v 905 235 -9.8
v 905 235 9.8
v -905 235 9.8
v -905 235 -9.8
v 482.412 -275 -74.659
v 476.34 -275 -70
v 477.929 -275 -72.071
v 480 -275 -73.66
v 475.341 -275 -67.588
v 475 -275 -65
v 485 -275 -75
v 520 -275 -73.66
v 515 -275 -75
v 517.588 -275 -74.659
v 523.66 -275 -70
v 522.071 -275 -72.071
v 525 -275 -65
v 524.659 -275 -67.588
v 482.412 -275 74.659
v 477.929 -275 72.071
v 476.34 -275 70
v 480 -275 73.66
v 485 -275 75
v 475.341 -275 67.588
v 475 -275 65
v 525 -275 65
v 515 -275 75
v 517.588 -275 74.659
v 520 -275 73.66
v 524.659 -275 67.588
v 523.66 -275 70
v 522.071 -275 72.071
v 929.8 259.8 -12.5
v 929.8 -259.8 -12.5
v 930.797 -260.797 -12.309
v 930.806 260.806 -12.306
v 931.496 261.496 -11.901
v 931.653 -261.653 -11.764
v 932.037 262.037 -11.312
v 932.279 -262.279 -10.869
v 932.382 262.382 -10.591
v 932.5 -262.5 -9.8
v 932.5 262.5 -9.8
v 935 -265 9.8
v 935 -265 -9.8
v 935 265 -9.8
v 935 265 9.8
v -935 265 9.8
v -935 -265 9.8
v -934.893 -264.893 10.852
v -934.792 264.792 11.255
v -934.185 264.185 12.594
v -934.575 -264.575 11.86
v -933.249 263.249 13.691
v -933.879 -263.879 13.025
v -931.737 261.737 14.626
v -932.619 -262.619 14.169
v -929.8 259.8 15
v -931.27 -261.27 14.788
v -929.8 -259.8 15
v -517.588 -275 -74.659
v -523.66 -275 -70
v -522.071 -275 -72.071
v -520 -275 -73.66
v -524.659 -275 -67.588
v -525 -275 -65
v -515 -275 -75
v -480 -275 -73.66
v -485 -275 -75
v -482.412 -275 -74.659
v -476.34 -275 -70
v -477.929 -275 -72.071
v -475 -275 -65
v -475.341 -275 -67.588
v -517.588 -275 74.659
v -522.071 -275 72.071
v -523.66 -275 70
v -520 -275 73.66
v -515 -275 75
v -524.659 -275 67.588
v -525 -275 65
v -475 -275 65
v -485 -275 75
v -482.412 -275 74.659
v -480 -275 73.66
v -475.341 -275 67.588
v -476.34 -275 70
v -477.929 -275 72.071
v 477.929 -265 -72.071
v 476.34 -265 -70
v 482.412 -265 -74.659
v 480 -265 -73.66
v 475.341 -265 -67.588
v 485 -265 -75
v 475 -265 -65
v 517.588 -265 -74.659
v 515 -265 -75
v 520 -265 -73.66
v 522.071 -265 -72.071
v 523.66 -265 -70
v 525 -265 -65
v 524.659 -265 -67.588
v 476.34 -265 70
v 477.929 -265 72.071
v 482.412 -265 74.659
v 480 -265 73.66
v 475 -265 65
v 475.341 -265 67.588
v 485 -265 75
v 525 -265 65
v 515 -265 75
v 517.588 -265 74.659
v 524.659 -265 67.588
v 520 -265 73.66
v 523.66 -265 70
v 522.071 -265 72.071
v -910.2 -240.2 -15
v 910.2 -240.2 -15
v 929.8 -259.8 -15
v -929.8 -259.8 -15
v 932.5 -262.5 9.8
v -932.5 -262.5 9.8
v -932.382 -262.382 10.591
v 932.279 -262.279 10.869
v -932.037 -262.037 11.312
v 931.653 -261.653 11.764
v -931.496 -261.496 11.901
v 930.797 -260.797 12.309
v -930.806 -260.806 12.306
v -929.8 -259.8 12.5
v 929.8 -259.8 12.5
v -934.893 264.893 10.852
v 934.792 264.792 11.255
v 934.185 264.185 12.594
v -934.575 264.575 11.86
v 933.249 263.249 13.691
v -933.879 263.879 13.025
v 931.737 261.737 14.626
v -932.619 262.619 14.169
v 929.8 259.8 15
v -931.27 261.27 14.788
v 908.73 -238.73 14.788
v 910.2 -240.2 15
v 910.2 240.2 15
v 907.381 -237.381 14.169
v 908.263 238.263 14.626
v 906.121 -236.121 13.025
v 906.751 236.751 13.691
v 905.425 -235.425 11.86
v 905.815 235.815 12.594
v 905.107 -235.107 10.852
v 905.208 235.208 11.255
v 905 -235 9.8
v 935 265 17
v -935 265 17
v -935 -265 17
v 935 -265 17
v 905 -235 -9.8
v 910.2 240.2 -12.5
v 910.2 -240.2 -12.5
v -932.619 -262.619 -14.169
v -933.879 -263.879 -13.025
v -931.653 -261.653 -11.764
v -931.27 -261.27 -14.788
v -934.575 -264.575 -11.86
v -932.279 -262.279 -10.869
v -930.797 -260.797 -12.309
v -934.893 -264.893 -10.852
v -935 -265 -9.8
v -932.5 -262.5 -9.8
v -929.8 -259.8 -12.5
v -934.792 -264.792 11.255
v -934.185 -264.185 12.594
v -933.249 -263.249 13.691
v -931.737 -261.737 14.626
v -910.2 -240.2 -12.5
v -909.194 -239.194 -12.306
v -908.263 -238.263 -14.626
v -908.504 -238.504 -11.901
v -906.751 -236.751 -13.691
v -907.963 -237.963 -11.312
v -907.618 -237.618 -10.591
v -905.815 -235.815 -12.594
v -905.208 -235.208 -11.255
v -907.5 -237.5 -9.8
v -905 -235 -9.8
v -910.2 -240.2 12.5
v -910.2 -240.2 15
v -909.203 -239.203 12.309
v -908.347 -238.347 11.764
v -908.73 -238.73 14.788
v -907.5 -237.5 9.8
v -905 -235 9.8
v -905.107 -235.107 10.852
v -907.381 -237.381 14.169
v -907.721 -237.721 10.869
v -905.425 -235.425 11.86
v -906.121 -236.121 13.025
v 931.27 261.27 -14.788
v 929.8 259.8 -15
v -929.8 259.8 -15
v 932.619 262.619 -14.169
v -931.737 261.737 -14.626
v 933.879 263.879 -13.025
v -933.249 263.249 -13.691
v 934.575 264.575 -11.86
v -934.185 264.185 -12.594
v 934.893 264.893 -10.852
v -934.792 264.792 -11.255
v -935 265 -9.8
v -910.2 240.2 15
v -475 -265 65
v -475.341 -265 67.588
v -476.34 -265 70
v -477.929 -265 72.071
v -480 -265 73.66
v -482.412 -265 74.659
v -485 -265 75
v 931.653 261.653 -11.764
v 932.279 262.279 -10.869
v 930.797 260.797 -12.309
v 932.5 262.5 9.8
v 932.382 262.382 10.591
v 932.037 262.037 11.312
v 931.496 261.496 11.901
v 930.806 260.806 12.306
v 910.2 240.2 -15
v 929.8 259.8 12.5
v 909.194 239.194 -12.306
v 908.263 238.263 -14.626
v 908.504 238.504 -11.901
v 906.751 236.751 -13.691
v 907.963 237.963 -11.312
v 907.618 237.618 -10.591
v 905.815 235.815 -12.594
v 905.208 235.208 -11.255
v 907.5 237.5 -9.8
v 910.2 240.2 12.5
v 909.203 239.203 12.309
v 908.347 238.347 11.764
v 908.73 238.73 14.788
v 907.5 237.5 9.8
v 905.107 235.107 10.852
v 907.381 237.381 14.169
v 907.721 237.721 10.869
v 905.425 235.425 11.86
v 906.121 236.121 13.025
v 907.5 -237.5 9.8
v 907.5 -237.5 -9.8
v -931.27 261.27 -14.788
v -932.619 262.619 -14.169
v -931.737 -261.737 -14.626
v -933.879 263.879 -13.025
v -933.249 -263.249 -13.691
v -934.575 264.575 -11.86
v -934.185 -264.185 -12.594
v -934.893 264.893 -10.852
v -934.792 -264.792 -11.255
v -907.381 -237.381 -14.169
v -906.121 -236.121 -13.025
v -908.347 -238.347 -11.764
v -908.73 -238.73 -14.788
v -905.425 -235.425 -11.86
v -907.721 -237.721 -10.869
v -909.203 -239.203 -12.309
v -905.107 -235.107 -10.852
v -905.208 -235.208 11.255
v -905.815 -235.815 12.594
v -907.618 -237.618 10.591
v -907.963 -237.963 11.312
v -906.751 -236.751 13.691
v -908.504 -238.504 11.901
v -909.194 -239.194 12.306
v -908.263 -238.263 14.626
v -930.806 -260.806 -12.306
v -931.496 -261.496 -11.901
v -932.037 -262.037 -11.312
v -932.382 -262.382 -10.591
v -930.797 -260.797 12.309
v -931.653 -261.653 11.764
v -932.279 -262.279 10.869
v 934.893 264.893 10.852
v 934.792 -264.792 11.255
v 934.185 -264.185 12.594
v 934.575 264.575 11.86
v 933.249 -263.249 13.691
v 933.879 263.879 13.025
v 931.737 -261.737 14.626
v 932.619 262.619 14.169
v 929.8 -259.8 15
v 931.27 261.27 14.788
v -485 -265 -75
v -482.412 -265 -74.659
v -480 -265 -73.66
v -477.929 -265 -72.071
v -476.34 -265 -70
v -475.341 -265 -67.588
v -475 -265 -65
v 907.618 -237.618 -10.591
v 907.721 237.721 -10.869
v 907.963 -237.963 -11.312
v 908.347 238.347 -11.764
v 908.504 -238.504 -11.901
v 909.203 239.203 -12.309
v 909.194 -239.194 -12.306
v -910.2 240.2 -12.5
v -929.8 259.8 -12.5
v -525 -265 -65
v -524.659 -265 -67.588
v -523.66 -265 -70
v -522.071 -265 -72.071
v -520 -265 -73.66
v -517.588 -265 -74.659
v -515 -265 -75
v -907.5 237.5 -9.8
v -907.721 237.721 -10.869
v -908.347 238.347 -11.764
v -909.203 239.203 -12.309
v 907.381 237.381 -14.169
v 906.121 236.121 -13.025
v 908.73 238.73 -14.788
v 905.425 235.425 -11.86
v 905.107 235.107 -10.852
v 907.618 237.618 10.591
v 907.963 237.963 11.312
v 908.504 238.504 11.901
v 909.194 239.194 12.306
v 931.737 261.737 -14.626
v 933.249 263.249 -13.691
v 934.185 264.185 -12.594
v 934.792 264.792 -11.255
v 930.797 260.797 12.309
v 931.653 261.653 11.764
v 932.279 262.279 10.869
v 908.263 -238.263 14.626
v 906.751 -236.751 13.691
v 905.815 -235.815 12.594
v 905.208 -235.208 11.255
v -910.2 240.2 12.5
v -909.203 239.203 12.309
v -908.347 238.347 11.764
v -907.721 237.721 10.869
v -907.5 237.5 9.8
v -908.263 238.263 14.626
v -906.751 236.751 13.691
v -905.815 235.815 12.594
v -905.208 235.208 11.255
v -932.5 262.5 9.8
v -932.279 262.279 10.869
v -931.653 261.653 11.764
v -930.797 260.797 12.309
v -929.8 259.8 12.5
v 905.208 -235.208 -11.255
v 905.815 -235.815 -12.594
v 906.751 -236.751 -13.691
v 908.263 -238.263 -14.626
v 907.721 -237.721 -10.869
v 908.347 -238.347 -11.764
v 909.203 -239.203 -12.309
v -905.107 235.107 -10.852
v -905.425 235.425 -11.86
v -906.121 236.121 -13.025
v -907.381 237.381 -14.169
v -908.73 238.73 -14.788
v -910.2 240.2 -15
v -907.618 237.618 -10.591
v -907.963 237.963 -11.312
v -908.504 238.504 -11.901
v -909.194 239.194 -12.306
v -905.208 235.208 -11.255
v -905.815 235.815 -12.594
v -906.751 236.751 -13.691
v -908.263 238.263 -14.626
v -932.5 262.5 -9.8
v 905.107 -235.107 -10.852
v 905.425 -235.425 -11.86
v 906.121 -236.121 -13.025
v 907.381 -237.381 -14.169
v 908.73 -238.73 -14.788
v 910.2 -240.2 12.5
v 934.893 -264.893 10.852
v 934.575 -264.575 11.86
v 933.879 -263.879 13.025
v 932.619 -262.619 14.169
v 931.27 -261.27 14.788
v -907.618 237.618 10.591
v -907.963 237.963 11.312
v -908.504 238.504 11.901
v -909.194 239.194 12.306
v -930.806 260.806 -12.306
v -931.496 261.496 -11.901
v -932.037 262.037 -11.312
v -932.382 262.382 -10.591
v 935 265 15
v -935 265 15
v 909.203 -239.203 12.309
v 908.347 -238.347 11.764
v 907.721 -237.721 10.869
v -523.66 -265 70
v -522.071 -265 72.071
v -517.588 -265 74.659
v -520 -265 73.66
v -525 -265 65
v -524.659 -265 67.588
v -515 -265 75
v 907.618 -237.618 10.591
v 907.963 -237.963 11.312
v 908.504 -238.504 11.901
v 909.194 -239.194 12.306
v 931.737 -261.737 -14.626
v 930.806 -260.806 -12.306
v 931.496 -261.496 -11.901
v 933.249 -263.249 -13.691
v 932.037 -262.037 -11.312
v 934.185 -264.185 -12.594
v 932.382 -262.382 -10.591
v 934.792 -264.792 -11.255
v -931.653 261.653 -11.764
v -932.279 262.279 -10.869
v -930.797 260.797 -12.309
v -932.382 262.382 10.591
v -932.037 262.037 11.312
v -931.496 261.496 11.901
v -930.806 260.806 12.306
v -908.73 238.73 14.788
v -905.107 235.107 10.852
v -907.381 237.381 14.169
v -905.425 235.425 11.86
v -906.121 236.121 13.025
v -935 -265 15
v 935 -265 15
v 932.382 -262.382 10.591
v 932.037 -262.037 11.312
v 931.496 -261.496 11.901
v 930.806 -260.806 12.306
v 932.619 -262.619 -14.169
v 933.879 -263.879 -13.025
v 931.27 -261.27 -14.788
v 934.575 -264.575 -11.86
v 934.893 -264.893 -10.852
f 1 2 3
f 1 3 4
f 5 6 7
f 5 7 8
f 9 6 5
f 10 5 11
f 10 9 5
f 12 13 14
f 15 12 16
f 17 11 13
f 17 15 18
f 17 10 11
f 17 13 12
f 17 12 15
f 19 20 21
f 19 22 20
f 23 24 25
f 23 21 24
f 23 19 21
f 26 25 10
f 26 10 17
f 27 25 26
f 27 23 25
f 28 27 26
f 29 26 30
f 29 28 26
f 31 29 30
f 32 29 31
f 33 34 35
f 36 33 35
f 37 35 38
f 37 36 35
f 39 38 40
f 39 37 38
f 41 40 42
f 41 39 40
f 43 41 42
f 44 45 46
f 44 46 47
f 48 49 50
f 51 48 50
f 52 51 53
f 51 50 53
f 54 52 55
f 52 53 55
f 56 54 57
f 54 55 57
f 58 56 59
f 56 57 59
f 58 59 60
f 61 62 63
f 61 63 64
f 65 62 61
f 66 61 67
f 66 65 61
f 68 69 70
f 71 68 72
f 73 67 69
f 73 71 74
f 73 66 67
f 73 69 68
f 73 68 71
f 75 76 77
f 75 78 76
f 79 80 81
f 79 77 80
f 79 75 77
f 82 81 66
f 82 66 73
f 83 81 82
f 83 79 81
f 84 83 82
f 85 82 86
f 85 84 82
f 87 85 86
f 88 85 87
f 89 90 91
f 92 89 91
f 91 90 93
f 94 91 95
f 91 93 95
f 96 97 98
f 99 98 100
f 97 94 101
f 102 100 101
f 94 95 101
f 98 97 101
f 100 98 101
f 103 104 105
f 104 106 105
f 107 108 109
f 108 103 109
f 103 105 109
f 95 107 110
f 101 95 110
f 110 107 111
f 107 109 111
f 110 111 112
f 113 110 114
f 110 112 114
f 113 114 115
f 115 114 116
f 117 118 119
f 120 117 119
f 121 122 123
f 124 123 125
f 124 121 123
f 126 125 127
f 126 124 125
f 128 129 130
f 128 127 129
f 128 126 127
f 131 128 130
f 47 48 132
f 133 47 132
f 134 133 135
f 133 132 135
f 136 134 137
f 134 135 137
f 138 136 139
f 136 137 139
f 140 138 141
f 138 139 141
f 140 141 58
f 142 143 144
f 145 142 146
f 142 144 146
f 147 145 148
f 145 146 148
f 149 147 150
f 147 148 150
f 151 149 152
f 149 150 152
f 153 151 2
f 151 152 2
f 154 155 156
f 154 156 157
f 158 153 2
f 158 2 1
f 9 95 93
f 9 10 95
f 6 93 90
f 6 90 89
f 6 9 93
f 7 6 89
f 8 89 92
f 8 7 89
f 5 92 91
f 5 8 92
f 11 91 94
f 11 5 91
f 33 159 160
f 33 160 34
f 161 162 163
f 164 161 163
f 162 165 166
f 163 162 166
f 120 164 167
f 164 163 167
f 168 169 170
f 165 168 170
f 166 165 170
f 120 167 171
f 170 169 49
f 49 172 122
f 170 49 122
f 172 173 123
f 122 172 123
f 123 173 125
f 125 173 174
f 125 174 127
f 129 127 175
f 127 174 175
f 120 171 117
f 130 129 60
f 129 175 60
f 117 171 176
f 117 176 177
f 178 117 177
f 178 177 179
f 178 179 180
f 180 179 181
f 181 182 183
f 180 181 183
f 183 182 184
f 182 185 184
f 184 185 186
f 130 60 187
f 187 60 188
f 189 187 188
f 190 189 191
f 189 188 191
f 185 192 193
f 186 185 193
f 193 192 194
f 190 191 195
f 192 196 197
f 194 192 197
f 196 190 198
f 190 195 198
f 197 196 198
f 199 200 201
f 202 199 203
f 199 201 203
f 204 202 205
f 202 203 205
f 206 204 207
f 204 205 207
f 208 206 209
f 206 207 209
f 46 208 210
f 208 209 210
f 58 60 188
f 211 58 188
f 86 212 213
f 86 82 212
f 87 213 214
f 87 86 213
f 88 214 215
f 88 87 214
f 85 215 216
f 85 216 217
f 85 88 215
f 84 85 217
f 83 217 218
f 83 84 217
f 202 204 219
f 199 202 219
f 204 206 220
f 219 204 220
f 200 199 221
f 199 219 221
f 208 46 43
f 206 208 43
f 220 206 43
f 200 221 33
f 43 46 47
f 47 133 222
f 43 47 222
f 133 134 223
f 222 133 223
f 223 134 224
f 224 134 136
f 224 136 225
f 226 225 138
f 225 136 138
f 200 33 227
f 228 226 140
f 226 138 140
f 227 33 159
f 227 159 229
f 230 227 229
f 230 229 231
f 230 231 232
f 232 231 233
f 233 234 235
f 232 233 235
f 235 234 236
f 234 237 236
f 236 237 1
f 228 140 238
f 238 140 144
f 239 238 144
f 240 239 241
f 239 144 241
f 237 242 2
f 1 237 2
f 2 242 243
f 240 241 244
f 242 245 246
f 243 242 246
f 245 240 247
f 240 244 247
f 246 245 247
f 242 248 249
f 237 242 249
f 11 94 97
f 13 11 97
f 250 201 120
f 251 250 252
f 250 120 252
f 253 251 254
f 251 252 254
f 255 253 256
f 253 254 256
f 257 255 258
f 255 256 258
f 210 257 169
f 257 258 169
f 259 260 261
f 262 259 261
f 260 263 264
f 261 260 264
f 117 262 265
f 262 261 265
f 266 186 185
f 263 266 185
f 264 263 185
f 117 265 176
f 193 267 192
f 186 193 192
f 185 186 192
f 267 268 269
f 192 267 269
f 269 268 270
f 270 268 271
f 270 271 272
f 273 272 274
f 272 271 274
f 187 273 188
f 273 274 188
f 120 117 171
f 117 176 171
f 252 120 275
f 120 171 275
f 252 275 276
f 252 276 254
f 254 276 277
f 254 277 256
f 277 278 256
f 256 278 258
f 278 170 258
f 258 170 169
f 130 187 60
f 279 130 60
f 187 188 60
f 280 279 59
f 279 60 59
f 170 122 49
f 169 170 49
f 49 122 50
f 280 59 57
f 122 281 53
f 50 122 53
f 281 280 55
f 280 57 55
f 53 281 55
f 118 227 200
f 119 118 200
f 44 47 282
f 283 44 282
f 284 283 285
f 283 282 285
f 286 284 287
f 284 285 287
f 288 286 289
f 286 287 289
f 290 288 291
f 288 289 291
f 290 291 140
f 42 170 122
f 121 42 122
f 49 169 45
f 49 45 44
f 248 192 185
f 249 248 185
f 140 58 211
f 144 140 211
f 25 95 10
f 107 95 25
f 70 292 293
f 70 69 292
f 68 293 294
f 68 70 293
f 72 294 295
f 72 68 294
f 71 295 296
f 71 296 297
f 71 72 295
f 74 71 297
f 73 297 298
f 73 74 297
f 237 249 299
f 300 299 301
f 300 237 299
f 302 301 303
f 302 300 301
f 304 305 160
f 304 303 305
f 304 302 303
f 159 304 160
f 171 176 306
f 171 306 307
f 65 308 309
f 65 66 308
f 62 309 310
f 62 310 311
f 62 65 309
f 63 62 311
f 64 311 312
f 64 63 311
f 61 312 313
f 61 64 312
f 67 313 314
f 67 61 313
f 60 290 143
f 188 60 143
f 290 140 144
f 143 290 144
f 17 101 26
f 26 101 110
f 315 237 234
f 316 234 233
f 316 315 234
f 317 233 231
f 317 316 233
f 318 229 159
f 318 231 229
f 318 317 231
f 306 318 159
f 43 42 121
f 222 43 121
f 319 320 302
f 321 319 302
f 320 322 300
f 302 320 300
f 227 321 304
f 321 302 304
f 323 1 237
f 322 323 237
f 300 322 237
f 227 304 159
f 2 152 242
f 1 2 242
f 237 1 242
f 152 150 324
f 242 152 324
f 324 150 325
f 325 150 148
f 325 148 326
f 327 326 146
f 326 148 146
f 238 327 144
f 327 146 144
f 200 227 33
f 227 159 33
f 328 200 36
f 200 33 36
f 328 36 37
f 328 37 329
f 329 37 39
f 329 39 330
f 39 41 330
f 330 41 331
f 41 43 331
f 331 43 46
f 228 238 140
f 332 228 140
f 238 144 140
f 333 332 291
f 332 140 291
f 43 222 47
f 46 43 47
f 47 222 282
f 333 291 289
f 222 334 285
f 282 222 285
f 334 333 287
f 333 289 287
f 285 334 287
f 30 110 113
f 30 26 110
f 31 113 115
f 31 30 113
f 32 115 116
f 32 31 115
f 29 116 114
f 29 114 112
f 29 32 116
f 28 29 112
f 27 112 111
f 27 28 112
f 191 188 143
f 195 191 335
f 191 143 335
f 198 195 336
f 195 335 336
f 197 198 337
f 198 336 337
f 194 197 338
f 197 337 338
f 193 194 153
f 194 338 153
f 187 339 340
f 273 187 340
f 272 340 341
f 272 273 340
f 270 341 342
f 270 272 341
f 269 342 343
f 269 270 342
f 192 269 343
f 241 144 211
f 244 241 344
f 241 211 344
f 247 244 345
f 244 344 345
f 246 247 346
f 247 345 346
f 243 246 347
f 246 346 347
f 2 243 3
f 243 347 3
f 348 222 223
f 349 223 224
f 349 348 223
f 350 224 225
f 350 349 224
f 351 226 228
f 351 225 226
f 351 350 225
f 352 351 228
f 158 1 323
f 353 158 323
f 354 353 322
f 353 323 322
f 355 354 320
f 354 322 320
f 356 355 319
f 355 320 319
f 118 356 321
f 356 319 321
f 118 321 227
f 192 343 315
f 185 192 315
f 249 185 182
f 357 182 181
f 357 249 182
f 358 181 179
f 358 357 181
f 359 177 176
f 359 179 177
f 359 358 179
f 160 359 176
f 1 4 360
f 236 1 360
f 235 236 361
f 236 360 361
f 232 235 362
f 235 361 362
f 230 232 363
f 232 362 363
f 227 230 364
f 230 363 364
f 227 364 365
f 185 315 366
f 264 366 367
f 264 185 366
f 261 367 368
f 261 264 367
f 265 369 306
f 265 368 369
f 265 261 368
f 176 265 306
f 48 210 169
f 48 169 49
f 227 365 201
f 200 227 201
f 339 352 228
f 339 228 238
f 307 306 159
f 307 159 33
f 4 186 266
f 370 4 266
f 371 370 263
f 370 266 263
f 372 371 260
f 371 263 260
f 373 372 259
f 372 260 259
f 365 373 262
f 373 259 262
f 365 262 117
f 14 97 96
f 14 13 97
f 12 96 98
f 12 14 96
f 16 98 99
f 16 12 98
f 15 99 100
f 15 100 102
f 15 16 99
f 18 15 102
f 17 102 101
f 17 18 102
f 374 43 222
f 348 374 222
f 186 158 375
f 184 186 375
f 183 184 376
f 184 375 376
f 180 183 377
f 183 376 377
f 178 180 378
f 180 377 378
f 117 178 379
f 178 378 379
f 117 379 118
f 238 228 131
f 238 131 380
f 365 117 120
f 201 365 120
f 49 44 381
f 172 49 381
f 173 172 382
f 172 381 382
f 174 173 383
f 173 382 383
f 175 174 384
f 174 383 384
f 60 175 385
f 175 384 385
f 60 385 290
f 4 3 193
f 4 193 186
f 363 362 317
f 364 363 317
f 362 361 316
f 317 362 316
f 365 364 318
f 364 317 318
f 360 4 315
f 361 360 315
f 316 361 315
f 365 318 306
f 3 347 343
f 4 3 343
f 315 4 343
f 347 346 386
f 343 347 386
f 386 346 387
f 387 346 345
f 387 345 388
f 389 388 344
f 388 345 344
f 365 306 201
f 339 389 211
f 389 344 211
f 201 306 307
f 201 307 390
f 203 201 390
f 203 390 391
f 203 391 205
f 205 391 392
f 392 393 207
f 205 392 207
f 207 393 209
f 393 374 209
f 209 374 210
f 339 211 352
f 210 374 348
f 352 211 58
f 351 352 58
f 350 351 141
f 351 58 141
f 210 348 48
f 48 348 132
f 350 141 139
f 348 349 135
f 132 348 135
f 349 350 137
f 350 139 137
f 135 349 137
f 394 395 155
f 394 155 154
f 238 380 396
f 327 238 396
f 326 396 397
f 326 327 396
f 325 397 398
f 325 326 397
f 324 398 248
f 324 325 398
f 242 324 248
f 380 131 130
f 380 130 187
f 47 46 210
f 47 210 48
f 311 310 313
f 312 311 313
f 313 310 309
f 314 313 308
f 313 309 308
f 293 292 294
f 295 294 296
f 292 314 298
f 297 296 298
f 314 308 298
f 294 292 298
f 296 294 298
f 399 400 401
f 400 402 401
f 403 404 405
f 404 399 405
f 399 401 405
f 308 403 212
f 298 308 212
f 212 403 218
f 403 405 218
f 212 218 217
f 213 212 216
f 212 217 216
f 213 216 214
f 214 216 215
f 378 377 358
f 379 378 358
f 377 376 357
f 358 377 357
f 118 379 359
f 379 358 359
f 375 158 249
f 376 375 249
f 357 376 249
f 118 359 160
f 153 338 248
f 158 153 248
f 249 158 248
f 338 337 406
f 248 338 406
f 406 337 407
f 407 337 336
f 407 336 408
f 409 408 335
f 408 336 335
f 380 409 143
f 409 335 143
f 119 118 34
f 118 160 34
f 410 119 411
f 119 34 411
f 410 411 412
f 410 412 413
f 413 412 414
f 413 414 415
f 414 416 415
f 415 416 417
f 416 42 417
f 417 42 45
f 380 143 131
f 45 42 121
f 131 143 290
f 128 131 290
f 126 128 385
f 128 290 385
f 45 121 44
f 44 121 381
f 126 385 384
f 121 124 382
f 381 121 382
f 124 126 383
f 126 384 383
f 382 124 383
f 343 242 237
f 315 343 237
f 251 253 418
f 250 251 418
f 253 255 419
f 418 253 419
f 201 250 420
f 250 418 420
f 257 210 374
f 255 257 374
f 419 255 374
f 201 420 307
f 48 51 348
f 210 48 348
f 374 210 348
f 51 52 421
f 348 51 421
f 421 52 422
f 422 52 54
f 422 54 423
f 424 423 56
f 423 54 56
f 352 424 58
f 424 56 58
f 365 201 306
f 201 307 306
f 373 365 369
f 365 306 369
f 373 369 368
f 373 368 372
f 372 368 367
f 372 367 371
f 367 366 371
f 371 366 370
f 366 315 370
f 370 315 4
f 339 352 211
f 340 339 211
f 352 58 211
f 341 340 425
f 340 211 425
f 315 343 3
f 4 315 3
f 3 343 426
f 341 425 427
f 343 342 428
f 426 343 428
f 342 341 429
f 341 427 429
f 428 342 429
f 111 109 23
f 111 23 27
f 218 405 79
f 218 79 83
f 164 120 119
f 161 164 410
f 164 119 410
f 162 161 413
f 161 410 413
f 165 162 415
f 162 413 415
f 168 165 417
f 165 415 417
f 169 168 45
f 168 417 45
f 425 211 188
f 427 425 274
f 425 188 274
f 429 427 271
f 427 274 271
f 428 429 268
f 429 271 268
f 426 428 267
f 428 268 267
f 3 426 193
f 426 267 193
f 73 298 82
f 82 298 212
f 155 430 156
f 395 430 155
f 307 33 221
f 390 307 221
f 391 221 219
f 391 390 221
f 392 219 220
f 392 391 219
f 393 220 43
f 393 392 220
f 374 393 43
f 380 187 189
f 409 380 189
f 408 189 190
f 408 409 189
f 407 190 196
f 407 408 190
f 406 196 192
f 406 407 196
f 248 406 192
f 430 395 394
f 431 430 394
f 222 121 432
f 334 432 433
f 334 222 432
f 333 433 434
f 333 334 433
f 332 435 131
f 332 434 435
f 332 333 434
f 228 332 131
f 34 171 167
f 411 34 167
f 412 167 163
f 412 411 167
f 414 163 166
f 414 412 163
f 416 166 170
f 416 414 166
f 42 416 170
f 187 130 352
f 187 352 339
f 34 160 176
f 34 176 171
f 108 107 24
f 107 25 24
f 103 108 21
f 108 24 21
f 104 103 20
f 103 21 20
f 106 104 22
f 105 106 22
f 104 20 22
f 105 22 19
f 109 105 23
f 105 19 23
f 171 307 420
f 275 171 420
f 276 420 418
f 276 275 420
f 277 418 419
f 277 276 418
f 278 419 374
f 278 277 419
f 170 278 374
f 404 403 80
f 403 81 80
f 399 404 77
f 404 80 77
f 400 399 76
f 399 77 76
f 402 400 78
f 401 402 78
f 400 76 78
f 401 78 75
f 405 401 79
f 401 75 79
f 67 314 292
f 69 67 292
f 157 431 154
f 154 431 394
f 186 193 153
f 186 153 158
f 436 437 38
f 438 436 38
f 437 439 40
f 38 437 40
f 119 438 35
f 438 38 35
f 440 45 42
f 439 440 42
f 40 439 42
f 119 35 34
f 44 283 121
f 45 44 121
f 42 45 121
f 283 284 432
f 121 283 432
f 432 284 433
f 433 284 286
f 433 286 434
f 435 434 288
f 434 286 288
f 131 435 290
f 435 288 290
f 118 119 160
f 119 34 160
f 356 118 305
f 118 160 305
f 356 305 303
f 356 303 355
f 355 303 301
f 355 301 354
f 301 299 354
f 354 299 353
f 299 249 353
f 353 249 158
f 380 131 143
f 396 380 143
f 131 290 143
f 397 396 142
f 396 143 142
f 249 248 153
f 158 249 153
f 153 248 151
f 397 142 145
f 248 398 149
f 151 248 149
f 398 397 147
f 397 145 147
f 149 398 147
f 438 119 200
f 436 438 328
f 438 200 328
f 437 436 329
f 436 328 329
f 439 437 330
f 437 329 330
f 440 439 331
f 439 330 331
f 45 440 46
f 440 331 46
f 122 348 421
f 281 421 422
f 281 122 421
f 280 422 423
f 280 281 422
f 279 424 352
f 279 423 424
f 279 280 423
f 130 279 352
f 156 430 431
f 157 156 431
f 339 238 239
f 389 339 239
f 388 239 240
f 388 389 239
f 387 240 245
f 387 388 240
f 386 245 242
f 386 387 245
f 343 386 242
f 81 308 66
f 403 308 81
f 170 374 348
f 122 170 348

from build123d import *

# Parameters (mm, degrees)
MEMBER_1_DEPTH         = 522.213203436
MEMBER_1_DEPTH_BACK    = 22.213203436
MEMBER_1_2_DEPTH       = 1884.426406871
MEMBER_1_3_DEPTH       = 544.426406871
MEMBER_1_4_DEPTH       = 1884.426406871
SKETCH_3_W             = 1870
SKETCH_3_H             = 530
EXTRUDE_1_DEPTH        = 2
SKETCH_4_W             = 50
SKETCH_4_H             = 150
EXTRUDE_2_DEPTH        = 10
PATTERN_LINEAR_1_COUNT = 2
PATTERN_LINEAR_1_PITCH = 1000
FILLET_1_R             = 10
FILLET_2_R             = 10


with BuildPart() as part:
    # Sketch1 → Member 1 (new, two sides: drawn at the far end of the back side and taken through both)
    with BuildSketch(Plane(origin=(-920, -250, 0), x_dir=(-1, 0, 0), z_dir=(0, 1, 0)).offset(-MEMBER_1_DEPTH_BACK)):
        with BuildLine():
            Line((-9.8, -15), (9.8, -15))
            ThreePointArc((9.8, -15), (13.476955262, -13.476955262), (15, -9.8))
            Line((15, -9.8), (15, 9.8))
            ThreePointArc((15, 9.8), (13.476955262, 13.476955262), (9.8, 15))
            Line((9.8, 15), (-9.8, 15))
            ThreePointArc((-9.8, 15), (-13.476955262, 13.476955262), (-15, 9.8))
            Line((-15, 9.8), (-15, -9.8))
            ThreePointArc((-15, -9.8), (-13.476955262, -13.476955262), (-9.8, -15))
        make_face()
        with BuildLine():
            Line((-9.8, -12.5), (9.8, -12.5))
            ThreePointArc((9.8, -12.5), (11.709188309, -11.709188309), (12.5, -9.8))
            Line((12.5, -9.8), (12.5, 9.8))
            ThreePointArc((12.5, 9.8), (11.709188309, 11.709188309), (9.8, 12.5))
            Line((9.8, 12.5), (-9.8, 12.5))
            ThreePointArc((-9.8, 12.5), (-11.709188309, 11.709188309), (-12.5, 9.8))
            Line((-12.5, 9.8), (-12.5, -9.8))
            ThreePointArc((-12.5, -9.8), (-11.709188309, -11.709188309), (-9.8, -12.5))
        make_face(mode=Mode.SUBTRACT)
    extrude(amount=MEMBER_1_DEPTH + MEMBER_1_DEPTH_BACK)

    # Member 1 mitre 1
    split(bisect_by=Plane(origin=(-920, -250, 0), x_dir=(-0.707106781, -0.707106781, 0), z_dir=(-0.707106781, 0.707106781, 0)), keep=Keep.TOP)

    # Member 1 mitre 2
    split(bisect_by=Plane(origin=(-920, 250, 0), x_dir=(0.707106781, -0.707106781, 0), z_dir=(-0.707106781, -0.707106781, 0)), keep=Keep.TOP)


with BuildPart() as body_2:
    # Sketch1 on segment 2 (carried to segment 2) → Member 1 2 (new body)
    with BuildSketch(Plane(origin=(-942.213203436, 250, 0), x_dir=(0, 1, 0), z_dir=(1, 0, 0))):
        with BuildLine():
            Line((-9.8, -15), (9.8, -15))
            ThreePointArc((9.8, -15), (13.476955262, -13.476955262), (15, -9.8))
            Line((15, -9.8), (15, 9.8))
            ThreePointArc((15, 9.8), (13.476955262, 13.476955262), (9.8, 15))
            Line((9.8, 15), (-9.8, 15))
            ThreePointArc((-9.8, 15), (-13.476955262, 13.476955262), (-15, 9.8))
            Line((-15, 9.8), (-15, -9.8))
            ThreePointArc((-15, -9.8), (-13.476955262, -13.476955262), (-9.8, -15))
        make_face()
        with BuildLine():
            Line((-9.8, -12.5), (9.8, -12.5))
            ThreePointArc((9.8, -12.5), (11.709188309, -11.709188309), (12.5, -9.8))
            Line((12.5, -9.8), (12.5, 9.8))
            ThreePointArc((12.5, 9.8), (11.709188309, 11.709188309), (9.8, 12.5))
            Line((9.8, 12.5), (-9.8, 12.5))
            ThreePointArc((-9.8, 12.5), (-11.709188309, 11.709188309), (-12.5, 9.8))
            Line((-12.5, 9.8), (-12.5, -9.8))
            ThreePointArc((-12.5, -9.8), (-11.709188309, -11.709188309), (-9.8, -12.5))
        make_face(mode=Mode.SUBTRACT)
    extrude(amount=MEMBER_1_2_DEPTH)

    # Member 1 2 mitre 1
    split(bisect_by=Plane(origin=(920, 250, 0), x_dir=(-0.707106781, -0.707106781, 0), z_dir=(-0.707106781, 0.707106781, 0)), keep=Keep.TOP)

    # Member 1 2 mitre 2
    split(bisect_by=Plane(origin=(-920, 250, 0), x_dir=(-0.707106781, 0.707106781, 0), z_dir=(0.707106781, 0.707106781, 0)), keep=Keep.TOP)


with BuildPart() as body_3:
    # Sketch1 on segment 3 (carried to segment 3) → Member 1 3 (new body)
    with BuildSketch(Plane(origin=(920, 272.213203436, 0), x_dir=(1, 0, 0), z_dir=(0, -1, 0))):
        with BuildLine():
            Line((-9.8, -15), (9.8, -15))
            ThreePointArc((9.8, -15), (13.476955262, -13.476955262), (15, -9.8))
            Line((15, -9.8), (15, 9.8))
            ThreePointArc((15, 9.8), (13.476955262, 13.476955262), (9.8, 15))
            Line((9.8, 15), (-9.8, 15))
            ThreePointArc((-9.8, 15), (-13.476955262, 13.476955262), (-15, 9.8))
            Line((-15, 9.8), (-15, -9.8))
            ThreePointArc((-15, -9.8), (-13.476955262, -13.476955262), (-9.8, -15))
        make_face()
        with BuildLine():
            Line((-9.8, -12.5), (9.8, -12.5))
            ThreePointArc((9.8, -12.5), (11.709188309, -11.709188309), (12.5, -9.8))
            Line((12.5, -9.8), (12.5, 9.8))
            ThreePointArc((12.5, 9.8), (11.709188309, 11.709188309), (9.8, 12.5))
            Line((9.8, 12.5), (-9.8, 12.5))
            ThreePointArc((-9.8, 12.5), (-11.709188309, 11.709188309), (-12.5, 9.8))
            Line((-12.5, 9.8), (-12.5, -9.8))
            ThreePointArc((-12.5, -9.8), (-11.709188309, -11.709188309), (-9.8, -12.5))
        make_face(mode=Mode.SUBTRACT)
    extrude(amount=MEMBER_1_3_DEPTH)

    # Member 1 3 mitre 1
    split(bisect_by=Plane(origin=(920, -250, 0), x_dir=(-0.707106781, 0.707106781, 0), z_dir=(0.707106781, 0.707106781, 0)), keep=Keep.TOP)

    # Member 1 3 mitre 2
    split(bisect_by=Plane(origin=(920, 250, 0), x_dir=(0.707106781, 0.707106781, 0), z_dir=(0.707106781, -0.707106781, 0)), keep=Keep.TOP)


with BuildPart() as body_4:
    # Sketch1 on segment 4 (carried to segment 4) → Member 1 4 (new body)
    with BuildSketch(Plane(origin=(942.213203436, -250, 0), x_dir=(0, -1, 0), z_dir=(-1, 0, 0))):
        with BuildLine():
            Line((-9.8, -15), (9.8, -15))
            ThreePointArc((9.8, -15), (13.476955262, -13.476955262), (15, -9.8))
            Line((15, -9.8), (15, 9.8))
            ThreePointArc((15, 9.8), (13.476955262, 13.476955262), (9.8, 15))
            Line((9.8, 15), (-9.8, 15))
            ThreePointArc((-9.8, 15), (-13.476955262, 13.476955262), (-15, 9.8))
            Line((-15, 9.8), (-15, -9.8))
            ThreePointArc((-15, -9.8), (-13.476955262, -13.476955262), (-9.8, -15))
        make_face()
        with BuildLine():
            Line((-9.8, -12.5), (9.8, -12.5))
            ThreePointArc((9.8, -12.5), (11.709188309, -11.709188309), (12.5, -9.8))
            Line((12.5, -9.8), (12.5, 9.8))
            ThreePointArc((12.5, 9.8), (11.709188309, 11.709188309), (9.8, 12.5))
            Line((9.8, 12.5), (-9.8, 12.5))
            ThreePointArc((-9.8, 12.5), (-11.709188309, 11.709188309), (-12.5, 9.8))
            Line((-12.5, 9.8), (-12.5, -9.8))
            ThreePointArc((-12.5, -9.8), (-11.709188309, -11.709188309), (-9.8, -12.5))
        make_face(mode=Mode.SUBTRACT)
    extrude(amount=MEMBER_1_4_DEPTH)

    # Member 1 4 mitre 1
    split(bisect_by=Plane(origin=(920, -250, 0), x_dir=(0.707106781, -0.707106781, 0), z_dir=(-0.707106781, -0.707106781, 0)), keep=Keep.TOP)

    # Member 1 4 mitre 2
    split(bisect_by=Plane(origin=(-920, -250, 0), x_dir=(0.707106781, 0.707106781, 0), z_dir=(0.707106781, -0.707106781, 0)), keep=Keep.TOP)


with BuildPart() as body_5:
    # 草图3 → 凸台-拉伸1 (new body)
    with BuildSketch(Plane.XY.offset(15)):
        Rectangle(SKETCH_3_W, SKETCH_3_H)
    extrude(amount=EXTRUDE_1_DEPTH)


with BuildPart() as body_6:
    # 草图4 → 凸台-拉伸2 (new body)
    with BuildSketch(Plane.XZ.offset(265)):
        with Locations((-500, 0)):
            Rectangle(SKETCH_4_W, SKETCH_4_H)
    extrude_2 = extrude(amount=EXTRUDE_2_DEPTH)

    # 圆角1
    fillet_1_edges = [body_6.edges().sort_by_distance(p)[0] for p in [
        (-525, -270, 75),
        (-475, -270, 75),
        (-475, -270, -75),
        (-525, -270, -75),
    ]]
    fillet(fillet_1_edges, radius=FILLET_1_R)


with BuildPart() as pattern_linear_1_1:
    # 阵列(线性)1: 凸台-拉伸2 ×2
    with Locations(*[(i * PATTERN_LINEAR_1_PITCH, 0, 0) for i in range(1, PATTERN_LINEAR_1_COUNT)]):
        add(extrude_2)

    # 圆角2
    fillet_2_edges = [pattern_linear_1_1.edges().sort_by_distance(p)[0] for p in [
        (475, -270, 75),
        (525, -270, 75),
        (525, -270, -75),
        (475, -270, -75),
    ]]
    fillet(fillet_2_edges, radius=FILLET_2_R)


solid = Compound([part.part, body_2.part, body_3.part, body_4.part, body_5.part, body_6.part, pattern_linear_1_1.part])
